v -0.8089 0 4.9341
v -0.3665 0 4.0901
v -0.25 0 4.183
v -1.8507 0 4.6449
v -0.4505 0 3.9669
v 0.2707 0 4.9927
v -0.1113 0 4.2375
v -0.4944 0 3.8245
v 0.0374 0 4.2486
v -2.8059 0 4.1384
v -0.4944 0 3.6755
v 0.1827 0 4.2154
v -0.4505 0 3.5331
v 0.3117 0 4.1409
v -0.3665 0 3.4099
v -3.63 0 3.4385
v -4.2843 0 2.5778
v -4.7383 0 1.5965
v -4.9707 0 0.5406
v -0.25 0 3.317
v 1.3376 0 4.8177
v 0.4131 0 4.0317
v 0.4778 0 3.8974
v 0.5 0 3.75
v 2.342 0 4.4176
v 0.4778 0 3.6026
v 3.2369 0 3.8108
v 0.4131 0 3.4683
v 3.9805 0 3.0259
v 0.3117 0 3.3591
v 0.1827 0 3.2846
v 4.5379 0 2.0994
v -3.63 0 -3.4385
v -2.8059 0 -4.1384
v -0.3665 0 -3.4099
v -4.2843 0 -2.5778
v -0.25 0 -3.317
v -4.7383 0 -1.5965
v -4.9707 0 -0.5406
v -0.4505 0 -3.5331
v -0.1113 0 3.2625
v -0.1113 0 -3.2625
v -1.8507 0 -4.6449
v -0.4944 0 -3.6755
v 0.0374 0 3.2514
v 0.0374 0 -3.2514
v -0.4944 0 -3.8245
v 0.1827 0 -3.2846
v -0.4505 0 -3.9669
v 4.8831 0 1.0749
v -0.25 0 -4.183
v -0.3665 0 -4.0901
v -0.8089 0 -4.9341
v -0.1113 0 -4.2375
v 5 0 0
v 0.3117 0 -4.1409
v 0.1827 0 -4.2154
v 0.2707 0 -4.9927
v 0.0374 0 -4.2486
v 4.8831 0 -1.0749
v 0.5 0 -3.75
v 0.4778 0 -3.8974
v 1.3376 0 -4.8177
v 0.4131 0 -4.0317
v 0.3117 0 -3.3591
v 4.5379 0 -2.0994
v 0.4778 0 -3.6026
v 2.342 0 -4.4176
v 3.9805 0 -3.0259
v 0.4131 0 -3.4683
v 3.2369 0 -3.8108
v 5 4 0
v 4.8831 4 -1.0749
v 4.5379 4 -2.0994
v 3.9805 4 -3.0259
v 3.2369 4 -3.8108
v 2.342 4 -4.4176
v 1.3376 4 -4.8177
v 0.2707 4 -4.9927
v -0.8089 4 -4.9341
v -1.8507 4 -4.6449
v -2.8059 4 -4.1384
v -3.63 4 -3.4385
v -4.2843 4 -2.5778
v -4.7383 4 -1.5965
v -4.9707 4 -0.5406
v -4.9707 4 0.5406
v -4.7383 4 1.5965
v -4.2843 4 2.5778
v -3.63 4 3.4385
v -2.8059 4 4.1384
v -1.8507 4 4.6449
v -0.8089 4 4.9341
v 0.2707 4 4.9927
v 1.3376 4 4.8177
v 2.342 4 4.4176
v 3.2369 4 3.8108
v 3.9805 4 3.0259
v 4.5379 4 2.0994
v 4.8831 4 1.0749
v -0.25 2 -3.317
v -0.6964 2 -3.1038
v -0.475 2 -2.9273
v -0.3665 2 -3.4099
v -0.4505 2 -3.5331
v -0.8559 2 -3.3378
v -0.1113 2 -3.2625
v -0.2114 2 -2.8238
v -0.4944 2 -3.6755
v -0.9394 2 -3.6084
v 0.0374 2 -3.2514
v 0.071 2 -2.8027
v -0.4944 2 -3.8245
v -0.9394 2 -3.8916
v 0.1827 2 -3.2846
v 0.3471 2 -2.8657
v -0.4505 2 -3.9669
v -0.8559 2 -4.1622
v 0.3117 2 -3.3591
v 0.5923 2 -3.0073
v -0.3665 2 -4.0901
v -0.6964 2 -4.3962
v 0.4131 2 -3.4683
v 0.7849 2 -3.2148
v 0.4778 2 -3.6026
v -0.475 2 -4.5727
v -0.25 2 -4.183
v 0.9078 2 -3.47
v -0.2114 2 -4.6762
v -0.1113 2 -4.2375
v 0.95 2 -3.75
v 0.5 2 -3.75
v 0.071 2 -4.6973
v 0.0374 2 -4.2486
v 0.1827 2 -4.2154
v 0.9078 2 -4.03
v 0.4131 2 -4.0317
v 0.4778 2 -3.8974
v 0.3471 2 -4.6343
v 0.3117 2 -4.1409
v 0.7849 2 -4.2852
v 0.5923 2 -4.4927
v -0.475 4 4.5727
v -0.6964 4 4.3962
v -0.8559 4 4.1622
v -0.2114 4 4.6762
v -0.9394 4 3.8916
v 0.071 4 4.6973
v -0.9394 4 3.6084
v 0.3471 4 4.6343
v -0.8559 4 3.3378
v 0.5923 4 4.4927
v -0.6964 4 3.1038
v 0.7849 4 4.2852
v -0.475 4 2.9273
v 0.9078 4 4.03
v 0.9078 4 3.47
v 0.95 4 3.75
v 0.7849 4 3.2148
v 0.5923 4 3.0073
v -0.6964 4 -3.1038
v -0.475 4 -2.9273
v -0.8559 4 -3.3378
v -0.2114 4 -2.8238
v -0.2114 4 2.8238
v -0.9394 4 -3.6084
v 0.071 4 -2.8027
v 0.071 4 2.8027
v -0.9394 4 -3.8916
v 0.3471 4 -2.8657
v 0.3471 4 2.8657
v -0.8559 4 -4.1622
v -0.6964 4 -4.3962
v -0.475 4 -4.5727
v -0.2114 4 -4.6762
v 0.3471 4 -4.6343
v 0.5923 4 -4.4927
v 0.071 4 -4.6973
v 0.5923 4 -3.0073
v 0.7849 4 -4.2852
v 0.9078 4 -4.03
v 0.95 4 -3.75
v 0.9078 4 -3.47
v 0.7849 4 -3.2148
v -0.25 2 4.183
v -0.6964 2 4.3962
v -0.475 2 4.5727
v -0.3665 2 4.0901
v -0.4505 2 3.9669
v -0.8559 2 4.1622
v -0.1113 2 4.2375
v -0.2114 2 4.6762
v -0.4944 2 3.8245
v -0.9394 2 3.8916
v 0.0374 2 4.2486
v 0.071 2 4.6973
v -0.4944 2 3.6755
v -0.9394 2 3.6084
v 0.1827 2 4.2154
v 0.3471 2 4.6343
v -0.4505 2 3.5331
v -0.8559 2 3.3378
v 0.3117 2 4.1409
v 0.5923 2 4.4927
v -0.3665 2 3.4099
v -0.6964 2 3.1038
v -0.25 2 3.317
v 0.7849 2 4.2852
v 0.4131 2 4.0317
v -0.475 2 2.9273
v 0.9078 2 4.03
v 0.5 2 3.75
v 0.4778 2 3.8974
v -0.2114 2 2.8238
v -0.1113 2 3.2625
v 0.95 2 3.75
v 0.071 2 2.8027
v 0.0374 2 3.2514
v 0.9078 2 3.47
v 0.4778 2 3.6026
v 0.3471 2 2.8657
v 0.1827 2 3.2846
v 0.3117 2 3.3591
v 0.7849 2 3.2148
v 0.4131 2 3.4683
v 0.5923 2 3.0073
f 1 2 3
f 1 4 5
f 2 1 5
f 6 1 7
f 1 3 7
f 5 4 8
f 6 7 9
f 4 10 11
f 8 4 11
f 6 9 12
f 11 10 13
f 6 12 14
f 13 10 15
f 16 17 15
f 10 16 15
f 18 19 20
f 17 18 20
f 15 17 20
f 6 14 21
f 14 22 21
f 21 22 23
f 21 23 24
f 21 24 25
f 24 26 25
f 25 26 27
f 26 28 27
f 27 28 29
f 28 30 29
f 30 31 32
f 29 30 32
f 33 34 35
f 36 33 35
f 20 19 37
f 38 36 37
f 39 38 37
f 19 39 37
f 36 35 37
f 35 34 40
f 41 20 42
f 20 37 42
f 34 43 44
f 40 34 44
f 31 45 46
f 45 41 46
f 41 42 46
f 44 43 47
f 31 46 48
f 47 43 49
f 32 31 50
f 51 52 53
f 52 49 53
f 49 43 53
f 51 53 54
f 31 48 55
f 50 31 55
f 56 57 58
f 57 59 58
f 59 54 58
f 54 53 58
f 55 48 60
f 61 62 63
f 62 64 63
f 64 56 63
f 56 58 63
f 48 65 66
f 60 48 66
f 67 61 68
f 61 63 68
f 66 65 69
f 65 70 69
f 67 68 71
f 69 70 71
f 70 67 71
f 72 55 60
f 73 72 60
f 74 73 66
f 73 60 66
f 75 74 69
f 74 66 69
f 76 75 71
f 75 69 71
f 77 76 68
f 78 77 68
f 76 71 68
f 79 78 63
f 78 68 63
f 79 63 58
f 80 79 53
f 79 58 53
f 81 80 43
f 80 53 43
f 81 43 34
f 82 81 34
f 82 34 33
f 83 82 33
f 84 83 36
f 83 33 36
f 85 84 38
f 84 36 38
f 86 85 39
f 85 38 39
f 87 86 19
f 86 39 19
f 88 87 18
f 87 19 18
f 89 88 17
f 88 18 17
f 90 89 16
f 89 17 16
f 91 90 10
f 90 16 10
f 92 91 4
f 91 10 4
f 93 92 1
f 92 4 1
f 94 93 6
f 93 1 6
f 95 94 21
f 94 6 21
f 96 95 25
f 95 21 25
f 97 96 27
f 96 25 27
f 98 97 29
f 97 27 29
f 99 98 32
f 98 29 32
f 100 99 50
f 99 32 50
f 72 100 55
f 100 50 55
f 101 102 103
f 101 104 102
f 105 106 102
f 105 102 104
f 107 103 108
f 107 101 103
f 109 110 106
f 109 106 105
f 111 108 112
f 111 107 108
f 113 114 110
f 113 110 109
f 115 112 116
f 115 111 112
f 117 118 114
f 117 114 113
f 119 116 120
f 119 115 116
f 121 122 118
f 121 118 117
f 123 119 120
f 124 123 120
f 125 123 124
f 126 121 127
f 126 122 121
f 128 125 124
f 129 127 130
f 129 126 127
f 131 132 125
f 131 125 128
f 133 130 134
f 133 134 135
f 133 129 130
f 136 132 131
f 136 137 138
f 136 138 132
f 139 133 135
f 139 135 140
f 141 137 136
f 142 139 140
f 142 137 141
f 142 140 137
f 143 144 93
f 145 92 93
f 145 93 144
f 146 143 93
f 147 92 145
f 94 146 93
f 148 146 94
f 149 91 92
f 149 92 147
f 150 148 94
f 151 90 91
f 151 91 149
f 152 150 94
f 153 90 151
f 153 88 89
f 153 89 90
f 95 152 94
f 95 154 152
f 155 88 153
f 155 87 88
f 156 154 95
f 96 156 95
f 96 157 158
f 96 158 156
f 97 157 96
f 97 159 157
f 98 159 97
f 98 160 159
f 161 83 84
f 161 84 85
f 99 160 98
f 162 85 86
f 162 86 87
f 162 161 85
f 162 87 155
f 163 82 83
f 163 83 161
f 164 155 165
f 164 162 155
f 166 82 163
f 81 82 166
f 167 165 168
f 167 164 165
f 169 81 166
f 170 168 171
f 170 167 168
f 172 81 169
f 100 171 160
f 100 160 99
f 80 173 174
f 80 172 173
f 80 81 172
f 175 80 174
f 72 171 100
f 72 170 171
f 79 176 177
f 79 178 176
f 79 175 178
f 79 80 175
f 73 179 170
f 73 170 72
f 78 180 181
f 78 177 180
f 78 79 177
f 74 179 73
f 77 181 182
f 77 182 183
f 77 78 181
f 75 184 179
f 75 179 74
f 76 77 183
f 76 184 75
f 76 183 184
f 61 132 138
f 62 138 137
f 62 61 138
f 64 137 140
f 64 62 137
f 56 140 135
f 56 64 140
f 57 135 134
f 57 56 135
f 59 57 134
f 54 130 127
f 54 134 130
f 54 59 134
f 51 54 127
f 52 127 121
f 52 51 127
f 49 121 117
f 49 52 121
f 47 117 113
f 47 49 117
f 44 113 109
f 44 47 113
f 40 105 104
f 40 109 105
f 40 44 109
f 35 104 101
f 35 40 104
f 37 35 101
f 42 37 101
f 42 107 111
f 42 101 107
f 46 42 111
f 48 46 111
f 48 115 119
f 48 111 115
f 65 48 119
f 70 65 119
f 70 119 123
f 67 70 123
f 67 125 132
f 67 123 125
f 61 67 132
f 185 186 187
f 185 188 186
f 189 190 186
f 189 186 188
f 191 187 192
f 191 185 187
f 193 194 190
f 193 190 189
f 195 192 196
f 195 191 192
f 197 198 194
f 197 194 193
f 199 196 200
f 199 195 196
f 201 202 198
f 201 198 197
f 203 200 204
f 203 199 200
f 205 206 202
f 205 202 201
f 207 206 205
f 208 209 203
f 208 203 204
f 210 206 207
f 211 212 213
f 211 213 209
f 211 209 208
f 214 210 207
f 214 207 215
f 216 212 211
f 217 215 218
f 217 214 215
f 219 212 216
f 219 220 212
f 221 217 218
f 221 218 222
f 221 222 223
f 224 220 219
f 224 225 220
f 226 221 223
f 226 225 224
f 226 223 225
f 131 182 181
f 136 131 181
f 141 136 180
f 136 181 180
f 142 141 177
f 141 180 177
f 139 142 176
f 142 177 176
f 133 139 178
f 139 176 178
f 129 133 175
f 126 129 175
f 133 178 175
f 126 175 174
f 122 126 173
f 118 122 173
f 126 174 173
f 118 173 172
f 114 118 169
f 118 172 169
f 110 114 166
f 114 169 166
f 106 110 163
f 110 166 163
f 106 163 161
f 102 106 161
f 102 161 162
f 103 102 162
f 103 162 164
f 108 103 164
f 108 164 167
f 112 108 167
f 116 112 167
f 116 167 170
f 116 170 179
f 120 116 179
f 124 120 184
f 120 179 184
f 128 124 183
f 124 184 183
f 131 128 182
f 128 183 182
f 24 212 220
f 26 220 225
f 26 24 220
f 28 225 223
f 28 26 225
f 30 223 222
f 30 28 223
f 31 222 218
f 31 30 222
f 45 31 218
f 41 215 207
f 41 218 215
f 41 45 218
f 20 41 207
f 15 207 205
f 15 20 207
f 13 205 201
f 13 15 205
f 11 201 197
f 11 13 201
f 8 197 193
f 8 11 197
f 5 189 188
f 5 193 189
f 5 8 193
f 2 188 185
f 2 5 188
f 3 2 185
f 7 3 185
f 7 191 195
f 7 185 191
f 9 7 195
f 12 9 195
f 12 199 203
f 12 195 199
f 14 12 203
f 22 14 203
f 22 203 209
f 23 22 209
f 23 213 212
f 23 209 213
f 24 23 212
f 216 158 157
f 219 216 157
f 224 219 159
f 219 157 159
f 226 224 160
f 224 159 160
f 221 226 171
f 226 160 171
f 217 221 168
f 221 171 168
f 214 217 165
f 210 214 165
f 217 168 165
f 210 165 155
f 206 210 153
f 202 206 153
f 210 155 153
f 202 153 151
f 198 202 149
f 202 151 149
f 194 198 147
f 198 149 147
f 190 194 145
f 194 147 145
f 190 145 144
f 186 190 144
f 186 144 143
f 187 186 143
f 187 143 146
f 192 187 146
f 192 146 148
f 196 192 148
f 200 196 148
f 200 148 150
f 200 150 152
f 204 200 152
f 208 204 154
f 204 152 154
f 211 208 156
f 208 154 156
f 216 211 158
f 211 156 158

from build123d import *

# Parameters (mm, degrees)
SKETCH1_R           = 5
SKETCH1_R_2         = 0.5
BOSS_EXTRUDE1_DEPTH = 4
SKETCH2_R           = 0.95
CUT_EXTRUDE1_DEPTH  = 2


with BuildPart() as part:
    # Sketch1 → Boss-Extrude1 (new body)
    with BuildSketch(Plane(origin=(0, 0, 0), x_dir=(1, 0, 0), z_dir=(0, 1, 0))):
        Circle(SKETCH1_R)
        with Locations((0, 3.75)):
            Circle(SKETCH1_R_2, mode=Mode.SUBTRACT)
        with Locations((0, -3.75)):
            Circle(SKETCH1_R_2, mode=Mode.SUBTRACT)
    extrude(amount=BOSS_EXTRUDE1_DEPTH)

    # Sketch2 → Cut-Extrude1 (cut)
    with BuildSketch(Plane(origin=(0, 4, 0), x_dir=(1, 0, 0), z_dir=(0, 1, 0))):
        with Locations((0, 3.75)):
            Circle(SKETCH2_R)
        with Locations((0, -3.75)):
            Circle(SKETCH2_R)
    extrude(amount=-CUT_EXTRUDE1_DEPTH, mode=Mode.SUBTRACT)


solid = part.part
